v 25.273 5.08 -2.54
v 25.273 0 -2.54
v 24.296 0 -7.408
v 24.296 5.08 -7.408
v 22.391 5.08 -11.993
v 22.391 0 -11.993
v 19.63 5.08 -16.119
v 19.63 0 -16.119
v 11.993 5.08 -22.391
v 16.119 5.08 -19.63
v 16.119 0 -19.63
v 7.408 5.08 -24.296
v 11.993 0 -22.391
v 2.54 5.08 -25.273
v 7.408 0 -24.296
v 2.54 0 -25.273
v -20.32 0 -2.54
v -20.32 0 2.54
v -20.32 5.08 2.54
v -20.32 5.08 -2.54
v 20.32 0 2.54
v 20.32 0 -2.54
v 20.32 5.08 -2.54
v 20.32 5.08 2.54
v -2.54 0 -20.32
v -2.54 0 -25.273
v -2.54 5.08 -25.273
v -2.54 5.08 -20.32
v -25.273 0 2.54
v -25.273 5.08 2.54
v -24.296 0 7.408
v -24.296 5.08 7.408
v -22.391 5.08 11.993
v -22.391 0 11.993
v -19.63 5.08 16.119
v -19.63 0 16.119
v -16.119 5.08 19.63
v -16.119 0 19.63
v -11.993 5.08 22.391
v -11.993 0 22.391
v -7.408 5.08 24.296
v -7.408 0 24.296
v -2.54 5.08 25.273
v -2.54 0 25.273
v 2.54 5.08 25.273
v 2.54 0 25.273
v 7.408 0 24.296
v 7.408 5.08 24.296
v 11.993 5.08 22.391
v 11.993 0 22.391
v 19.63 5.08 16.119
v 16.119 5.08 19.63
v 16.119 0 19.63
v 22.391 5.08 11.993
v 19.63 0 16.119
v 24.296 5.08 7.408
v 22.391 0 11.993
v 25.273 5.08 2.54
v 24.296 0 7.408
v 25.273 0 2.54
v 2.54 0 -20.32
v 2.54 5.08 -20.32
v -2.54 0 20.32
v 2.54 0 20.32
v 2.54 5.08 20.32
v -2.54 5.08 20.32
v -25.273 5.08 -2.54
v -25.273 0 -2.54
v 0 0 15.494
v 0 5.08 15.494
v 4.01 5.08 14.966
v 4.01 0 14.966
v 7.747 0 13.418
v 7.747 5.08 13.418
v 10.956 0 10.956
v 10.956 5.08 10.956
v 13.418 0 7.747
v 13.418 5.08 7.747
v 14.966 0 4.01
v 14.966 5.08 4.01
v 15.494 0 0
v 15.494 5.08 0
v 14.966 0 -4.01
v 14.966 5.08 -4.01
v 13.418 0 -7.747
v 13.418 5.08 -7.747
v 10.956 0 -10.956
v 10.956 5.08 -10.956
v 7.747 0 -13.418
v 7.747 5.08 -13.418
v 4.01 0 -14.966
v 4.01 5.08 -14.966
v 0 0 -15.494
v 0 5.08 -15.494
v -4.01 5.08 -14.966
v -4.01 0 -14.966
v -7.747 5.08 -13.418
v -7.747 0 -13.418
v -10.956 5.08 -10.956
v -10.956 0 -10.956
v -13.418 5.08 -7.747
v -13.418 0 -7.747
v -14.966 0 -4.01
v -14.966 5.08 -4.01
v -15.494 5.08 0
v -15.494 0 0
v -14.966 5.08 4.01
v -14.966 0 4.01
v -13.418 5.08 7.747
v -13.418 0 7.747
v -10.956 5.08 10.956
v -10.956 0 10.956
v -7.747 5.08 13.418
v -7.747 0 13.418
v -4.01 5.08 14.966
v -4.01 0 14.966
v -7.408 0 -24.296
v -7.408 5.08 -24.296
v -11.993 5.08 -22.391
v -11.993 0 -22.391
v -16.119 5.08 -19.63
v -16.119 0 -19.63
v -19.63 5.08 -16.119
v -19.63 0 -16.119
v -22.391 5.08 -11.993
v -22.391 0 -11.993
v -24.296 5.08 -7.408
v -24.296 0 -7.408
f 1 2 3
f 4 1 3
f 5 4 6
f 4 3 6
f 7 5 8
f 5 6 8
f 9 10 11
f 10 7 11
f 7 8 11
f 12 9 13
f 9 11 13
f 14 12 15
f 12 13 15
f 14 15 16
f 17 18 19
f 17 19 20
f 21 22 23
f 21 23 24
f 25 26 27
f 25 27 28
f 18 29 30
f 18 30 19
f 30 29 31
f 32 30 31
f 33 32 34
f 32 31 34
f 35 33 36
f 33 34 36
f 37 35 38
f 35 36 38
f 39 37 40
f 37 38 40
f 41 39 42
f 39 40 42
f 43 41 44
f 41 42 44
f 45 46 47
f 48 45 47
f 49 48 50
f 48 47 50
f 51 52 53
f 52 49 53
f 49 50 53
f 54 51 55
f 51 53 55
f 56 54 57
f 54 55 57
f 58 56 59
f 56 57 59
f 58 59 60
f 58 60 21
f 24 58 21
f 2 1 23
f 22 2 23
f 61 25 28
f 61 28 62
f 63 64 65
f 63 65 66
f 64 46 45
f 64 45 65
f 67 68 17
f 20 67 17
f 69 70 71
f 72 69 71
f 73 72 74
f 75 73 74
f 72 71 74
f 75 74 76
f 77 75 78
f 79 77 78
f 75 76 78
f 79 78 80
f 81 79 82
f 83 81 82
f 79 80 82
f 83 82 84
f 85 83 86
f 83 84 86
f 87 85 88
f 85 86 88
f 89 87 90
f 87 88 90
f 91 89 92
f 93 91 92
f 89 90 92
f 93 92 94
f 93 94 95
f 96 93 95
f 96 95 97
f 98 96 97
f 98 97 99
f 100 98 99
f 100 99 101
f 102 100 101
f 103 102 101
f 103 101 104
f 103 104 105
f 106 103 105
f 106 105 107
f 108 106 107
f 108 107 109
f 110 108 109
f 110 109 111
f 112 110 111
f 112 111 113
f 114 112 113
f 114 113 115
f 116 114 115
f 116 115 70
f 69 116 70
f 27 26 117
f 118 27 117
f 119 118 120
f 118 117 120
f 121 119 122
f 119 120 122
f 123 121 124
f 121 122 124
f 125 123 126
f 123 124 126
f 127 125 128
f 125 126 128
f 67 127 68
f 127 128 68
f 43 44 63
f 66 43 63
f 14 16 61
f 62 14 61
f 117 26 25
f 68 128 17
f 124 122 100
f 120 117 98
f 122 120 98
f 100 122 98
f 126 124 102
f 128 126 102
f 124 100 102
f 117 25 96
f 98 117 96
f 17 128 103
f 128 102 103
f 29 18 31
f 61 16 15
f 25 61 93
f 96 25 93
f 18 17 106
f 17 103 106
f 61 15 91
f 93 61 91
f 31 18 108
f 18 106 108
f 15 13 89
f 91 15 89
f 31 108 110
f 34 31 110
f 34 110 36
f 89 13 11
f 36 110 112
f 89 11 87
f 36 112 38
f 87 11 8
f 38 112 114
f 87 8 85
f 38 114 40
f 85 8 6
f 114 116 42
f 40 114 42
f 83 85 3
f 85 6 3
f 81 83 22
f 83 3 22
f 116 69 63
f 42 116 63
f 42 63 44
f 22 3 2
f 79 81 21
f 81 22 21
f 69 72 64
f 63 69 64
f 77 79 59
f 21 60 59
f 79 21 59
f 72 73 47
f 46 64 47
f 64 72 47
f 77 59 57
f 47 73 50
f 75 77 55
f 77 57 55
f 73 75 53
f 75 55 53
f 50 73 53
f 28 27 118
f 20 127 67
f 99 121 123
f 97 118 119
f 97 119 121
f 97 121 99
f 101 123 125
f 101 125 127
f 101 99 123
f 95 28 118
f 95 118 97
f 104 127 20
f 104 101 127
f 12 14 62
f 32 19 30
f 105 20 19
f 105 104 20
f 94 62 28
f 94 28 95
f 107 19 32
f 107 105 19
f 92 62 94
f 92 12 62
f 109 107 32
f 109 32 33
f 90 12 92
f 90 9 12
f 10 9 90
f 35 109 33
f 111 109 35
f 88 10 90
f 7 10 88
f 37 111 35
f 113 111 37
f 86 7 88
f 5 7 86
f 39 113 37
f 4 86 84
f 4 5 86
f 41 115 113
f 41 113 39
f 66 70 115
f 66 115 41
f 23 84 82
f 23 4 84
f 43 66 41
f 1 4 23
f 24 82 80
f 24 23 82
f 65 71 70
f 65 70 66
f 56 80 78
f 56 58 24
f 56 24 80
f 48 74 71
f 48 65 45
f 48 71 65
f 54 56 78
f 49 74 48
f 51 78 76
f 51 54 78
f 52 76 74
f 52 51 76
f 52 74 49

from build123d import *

# Parameters (mm, degrees)
SKETCH1_R           = 25.4
BOSS_EXTRUDE1_DEPTH = 5.08
SKETCH2_R           = 15.494
CUT_EXTRUDE1_DEPTH  = 50.8
SKETCH3_W           = 5.08
SKETCH3_H           = 10.16
CUT_EXTRUDE2_DEPTH  = 50.8
CIRPATTERN1_COUNT   = 4


with BuildPart() as part:
    # Sketch1 → Boss-Extrude1 (new body)
    with BuildSketch(Plane(origin=(0, 0, 0), x_dir=(1, 0, 0), z_dir=(0, 1, 0))):
        with Locations(Location((0, 0, 0), (0, 0, 270))):
            Circle(SKETCH1_R)
    extrude(amount=BOSS_EXTRUDE1_DEPTH)

    # Sketch2 → Cut-Extrude1 (cut)
    with BuildSketch(Plane(origin=(0, 5.08, 0), x_dir=(1, 0, 0), z_dir=(0, 1, 0))):
        with Locations(Location((0, 0, 0), (0, 0, 270))):
            Circle(SKETCH2_R)
    extrude(amount=-CUT_EXTRUDE1_DEPTH, mode=Mode.SUBTRACT)

    # Sketch3 → Cut-Extrude2 (cut)
    with BuildSketch(Plane.XZ):
        with Locations((0, -25.4)):
            Rectangle(SKETCH3_W, SKETCH3_H)
    cut_extrude2 = extrude(amount=-CUT_EXTRUDE2_DEPTH, mode=Mode.SUBTRACT)

    # CirPattern1: Cut-Extrude2 ×4 about axis
    cirpattern1_axis = Axis((0, 0, 0), (0, 1, 0))
    for i in range(1, CIRPATTERN1_COUNT):
        add(cut_extrude2.rotate(cirpattern1_axis, i * 360 / CIRPATTERN1_COUNT), mode=Mode.SUBTRACT)


solid = part.part
